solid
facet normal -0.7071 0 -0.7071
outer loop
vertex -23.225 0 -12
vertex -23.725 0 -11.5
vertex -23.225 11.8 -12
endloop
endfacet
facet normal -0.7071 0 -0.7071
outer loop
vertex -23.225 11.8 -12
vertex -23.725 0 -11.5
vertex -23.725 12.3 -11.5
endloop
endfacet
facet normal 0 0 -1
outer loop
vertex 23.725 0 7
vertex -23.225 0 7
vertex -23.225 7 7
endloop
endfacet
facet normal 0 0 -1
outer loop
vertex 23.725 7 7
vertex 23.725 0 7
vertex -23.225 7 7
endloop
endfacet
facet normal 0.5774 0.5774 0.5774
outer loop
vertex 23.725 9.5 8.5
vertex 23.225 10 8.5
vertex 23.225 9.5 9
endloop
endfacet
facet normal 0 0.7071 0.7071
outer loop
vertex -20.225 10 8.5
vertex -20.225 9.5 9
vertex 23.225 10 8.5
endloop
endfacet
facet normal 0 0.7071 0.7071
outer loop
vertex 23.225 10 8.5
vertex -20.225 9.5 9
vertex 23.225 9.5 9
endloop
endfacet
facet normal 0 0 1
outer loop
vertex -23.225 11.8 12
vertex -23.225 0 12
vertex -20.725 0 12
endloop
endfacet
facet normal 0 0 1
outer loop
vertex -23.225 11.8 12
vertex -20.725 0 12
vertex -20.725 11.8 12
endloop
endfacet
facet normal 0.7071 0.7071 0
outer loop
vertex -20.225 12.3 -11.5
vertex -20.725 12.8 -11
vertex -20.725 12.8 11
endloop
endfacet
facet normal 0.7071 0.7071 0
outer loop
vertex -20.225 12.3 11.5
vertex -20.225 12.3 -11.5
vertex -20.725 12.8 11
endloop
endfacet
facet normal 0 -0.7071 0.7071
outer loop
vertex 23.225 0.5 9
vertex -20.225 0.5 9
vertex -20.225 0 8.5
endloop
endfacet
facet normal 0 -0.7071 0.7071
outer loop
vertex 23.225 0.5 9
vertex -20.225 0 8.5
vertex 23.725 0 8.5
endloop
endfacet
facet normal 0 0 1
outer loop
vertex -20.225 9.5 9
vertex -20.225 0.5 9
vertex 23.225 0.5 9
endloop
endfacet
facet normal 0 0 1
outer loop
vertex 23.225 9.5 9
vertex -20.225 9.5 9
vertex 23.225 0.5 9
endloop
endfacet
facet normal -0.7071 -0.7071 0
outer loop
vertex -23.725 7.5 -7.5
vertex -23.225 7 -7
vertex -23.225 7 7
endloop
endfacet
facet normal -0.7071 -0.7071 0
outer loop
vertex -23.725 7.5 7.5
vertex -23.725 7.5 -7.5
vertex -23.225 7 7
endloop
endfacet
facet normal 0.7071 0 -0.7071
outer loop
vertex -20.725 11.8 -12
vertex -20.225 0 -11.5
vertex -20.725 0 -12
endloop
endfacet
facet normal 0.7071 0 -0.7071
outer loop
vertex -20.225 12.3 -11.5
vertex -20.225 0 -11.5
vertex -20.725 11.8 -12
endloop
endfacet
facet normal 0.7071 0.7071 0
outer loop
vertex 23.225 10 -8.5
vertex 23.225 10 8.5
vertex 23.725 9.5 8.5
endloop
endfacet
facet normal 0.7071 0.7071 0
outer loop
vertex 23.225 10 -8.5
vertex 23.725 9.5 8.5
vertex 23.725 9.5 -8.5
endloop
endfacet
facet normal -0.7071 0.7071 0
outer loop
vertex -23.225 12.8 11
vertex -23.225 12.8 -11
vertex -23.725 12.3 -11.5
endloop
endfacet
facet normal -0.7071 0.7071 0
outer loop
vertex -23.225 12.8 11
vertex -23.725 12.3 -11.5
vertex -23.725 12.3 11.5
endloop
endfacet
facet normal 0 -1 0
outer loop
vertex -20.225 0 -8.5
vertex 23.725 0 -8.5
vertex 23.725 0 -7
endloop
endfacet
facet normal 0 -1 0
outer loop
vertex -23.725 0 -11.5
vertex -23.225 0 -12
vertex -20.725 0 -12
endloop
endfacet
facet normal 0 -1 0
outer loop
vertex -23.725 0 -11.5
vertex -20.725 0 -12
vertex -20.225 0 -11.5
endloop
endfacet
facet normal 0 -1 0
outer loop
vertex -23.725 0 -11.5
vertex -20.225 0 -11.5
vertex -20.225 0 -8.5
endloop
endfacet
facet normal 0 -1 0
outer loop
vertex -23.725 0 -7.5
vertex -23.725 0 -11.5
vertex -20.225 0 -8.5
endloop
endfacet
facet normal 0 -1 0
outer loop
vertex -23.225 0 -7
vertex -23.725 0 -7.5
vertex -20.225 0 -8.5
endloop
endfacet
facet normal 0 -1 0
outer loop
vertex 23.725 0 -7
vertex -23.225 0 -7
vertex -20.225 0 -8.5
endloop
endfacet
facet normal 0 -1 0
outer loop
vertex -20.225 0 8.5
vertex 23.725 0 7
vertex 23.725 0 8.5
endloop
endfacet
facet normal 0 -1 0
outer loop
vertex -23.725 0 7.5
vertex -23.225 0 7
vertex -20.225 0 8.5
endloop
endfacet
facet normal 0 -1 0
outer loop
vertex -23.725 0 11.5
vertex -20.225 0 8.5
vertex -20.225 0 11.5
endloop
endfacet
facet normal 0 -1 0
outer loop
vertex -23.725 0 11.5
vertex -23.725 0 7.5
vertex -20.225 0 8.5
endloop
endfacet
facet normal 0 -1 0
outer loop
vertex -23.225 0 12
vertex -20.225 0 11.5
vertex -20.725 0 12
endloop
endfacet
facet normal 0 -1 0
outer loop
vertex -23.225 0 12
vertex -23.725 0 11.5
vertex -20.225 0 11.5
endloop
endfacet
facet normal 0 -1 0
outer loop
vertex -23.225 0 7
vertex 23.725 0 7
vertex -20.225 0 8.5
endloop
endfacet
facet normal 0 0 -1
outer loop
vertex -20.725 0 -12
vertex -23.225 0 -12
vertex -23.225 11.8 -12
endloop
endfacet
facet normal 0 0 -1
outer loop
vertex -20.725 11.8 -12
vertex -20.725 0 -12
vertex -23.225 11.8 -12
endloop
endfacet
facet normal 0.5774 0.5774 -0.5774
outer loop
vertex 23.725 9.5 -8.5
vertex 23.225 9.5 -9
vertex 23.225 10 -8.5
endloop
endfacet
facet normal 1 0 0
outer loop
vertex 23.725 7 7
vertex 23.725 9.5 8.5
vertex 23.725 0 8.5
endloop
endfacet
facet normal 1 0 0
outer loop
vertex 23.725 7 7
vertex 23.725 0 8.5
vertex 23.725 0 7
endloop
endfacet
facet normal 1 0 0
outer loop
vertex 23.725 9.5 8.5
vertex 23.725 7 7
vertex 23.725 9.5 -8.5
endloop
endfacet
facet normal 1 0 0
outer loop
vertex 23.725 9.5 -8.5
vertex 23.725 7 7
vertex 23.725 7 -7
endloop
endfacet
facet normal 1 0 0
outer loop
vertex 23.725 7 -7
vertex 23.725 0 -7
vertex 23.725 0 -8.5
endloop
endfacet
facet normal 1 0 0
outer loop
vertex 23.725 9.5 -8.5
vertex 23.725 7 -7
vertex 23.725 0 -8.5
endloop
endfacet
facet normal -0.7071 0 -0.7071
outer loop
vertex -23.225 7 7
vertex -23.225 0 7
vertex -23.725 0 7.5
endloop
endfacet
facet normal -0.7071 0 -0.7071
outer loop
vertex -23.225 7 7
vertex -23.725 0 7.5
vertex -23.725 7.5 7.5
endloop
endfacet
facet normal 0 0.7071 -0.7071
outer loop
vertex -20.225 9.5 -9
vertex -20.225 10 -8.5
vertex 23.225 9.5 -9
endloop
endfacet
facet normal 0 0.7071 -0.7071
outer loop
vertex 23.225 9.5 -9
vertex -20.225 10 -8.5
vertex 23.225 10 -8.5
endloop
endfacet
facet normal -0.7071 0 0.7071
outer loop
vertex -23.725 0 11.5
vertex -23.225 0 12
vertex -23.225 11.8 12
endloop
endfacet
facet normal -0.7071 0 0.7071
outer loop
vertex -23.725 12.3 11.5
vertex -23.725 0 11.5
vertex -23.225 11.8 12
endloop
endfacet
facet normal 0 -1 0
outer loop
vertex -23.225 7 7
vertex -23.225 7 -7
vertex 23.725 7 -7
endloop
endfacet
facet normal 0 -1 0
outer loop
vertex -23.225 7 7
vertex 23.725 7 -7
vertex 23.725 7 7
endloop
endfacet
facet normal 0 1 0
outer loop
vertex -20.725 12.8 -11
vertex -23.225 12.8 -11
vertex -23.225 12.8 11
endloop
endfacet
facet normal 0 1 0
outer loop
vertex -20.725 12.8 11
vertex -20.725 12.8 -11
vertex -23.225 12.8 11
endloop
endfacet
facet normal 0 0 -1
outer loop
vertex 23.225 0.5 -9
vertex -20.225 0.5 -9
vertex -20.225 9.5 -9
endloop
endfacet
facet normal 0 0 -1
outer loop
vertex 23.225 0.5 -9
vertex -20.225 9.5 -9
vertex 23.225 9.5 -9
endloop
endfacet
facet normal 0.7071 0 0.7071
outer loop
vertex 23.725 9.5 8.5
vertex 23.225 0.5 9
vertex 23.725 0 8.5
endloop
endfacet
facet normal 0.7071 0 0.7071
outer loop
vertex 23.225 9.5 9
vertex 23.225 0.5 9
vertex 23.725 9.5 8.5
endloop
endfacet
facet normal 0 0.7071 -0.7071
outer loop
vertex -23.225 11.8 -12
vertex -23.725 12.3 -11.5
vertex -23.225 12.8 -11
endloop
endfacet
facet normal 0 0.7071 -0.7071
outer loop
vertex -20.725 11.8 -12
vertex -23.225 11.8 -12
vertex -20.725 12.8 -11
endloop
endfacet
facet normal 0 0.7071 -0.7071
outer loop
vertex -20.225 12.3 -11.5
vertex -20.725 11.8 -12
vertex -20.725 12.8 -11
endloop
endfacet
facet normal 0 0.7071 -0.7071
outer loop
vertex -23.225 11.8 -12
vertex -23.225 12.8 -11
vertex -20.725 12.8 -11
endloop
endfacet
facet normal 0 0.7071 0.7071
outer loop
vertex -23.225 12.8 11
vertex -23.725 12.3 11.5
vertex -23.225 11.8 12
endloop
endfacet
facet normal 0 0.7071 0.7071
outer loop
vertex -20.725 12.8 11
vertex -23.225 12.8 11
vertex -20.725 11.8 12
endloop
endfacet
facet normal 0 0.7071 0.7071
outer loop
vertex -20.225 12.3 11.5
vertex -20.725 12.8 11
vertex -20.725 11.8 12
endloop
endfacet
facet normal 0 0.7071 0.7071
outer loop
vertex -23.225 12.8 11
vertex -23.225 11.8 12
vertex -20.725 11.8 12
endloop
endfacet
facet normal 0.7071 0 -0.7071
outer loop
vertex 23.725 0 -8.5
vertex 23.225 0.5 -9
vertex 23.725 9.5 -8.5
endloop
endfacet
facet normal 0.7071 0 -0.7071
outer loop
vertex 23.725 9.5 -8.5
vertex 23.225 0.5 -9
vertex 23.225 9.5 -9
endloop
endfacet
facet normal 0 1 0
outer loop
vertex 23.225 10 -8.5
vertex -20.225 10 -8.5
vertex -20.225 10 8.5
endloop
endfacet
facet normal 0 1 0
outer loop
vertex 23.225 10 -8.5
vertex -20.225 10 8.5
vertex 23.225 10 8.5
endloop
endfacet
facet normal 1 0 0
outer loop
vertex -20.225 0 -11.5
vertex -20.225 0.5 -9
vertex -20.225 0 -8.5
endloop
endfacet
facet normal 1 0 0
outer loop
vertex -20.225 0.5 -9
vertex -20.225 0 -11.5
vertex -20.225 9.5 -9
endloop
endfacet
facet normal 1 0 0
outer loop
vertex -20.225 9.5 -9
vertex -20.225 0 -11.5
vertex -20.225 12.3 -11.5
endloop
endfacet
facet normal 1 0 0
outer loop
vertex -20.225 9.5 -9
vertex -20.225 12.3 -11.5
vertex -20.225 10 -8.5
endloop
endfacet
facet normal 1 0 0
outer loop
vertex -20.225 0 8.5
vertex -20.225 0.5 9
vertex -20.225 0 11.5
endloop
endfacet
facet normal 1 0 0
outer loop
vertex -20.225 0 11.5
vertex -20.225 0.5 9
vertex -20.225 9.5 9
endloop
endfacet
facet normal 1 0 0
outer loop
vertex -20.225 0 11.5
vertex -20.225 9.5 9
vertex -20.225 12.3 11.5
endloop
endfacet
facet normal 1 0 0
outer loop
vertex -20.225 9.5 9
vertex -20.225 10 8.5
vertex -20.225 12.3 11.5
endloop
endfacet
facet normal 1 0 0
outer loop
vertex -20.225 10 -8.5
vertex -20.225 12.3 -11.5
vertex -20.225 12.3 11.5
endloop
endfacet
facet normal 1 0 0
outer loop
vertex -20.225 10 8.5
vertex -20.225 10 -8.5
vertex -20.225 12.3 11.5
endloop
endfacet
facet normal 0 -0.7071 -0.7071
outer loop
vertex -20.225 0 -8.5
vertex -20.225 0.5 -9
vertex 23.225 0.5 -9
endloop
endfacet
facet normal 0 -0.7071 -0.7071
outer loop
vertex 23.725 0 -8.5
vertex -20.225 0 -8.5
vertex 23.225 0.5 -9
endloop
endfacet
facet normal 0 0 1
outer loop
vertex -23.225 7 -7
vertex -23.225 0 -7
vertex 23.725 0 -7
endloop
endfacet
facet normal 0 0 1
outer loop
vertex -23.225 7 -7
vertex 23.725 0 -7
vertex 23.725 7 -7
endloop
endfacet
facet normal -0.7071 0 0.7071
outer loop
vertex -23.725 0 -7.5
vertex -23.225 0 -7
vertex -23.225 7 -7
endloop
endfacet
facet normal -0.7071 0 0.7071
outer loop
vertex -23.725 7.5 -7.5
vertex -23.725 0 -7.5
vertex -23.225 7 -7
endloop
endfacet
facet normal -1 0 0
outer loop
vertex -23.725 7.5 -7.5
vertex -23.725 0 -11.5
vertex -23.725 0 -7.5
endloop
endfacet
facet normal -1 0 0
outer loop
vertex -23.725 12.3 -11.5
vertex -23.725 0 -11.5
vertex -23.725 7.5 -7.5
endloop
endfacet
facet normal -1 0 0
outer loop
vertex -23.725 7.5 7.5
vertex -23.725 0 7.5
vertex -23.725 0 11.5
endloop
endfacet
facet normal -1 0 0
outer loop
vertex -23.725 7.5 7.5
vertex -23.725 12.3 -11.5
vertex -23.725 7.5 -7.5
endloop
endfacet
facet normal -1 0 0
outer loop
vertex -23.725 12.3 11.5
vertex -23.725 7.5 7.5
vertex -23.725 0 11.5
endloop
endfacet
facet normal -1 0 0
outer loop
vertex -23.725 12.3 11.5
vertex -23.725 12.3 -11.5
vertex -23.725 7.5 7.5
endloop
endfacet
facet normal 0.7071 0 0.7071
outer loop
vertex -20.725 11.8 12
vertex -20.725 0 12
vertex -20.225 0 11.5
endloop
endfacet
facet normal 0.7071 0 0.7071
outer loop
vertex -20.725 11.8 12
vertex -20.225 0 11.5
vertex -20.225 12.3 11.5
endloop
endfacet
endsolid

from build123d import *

# Parameters (mm, degrees)
SKETCH_1_W          = 47.45
SKETCH_1_H          = 18
EXTRUDE_1_DEPTH     = 10
SKETCH_2_W          = 24
SKETCH_2_H          = 12.8
EXTRUDE_2_DEPTH     = 3.5
SKETCH_3_W          = 14
SKETCH_3_H          = 7
CUT_EXTRUDE_1_DEPTH = 47.45
CHAMFER_1_SIZE      = 1
CHAMFER_2_SIZE      = 0.5


with BuildPart() as part:
    # 草图1 → 凸台-拉伸1 (new body)
    with BuildSketch(Plane(origin=(0, 0, 0), x_dir=(1, 0, 0), z_dir=(0, 1, 0))):
        Rectangle(SKETCH_1_W, SKETCH_1_H)
    extrude(amount=EXTRUDE_1_DEPTH)

    # 草图2 → 凸台-拉伸2 (add)
    with BuildSketch(Plane.ZY.offset(23.725)):
        with Locations((0, 6.4)):
            Rectangle(SKETCH_2_W, SKETCH_2_H)
    extrude(amount=-EXTRUDE_2_DEPTH)

    # 草图3 → 切除-拉伸1 (cut)
    with BuildSketch(Plane.ZY.offset(23.725)):
        with Locations((0, 3.5)):
            Rectangle(SKETCH_3_W, SKETCH_3_H)
    extrude(amount=-CUT_EXTRUDE_1_DEPTH, mode=Mode.SUBTRACT)

    # 倒角1
    chamfer_1_edges = [part.edges().sort_by_distance(p)[0] for p in [
        (-21.975, 12.8, -12),
        (-21.975, 12.8, 12),
    ]]
    chamfer(chamfer_1_edges, length=CHAMFER_1_SIZE)

    # 倒角2
    chamfer_2_edges = [part.edges().sort_by_distance(p)[0] for p in [
        (1.75, 0, 9),
        (1.75, 0, -9),
        (1.75, 10, -9),
        (1.75, 10, 9),
        (23.725, 5, -9),
        (23.725, 10, 0),
        (23.725, 5, 9),
        (-20.225, 5.9, -12),
        (-20.225, 12.8, 0),
        (-20.225, 5.9, 12),
        (-23.725, 12.8, 0),
        (-23.725, 5.9, -12),
        (-23.725, 5.9, 12),
        (-23.725, 3.5, 7),
        (-23.725, 7, 0),
        (-23.725, 3.5, -7),
    ]]
    chamfer(chamfer_2_edges, length=CHAMFER_2_SIZE - 0.0001)  # a hair under: the kernel refuses the full size


solid = part.part
